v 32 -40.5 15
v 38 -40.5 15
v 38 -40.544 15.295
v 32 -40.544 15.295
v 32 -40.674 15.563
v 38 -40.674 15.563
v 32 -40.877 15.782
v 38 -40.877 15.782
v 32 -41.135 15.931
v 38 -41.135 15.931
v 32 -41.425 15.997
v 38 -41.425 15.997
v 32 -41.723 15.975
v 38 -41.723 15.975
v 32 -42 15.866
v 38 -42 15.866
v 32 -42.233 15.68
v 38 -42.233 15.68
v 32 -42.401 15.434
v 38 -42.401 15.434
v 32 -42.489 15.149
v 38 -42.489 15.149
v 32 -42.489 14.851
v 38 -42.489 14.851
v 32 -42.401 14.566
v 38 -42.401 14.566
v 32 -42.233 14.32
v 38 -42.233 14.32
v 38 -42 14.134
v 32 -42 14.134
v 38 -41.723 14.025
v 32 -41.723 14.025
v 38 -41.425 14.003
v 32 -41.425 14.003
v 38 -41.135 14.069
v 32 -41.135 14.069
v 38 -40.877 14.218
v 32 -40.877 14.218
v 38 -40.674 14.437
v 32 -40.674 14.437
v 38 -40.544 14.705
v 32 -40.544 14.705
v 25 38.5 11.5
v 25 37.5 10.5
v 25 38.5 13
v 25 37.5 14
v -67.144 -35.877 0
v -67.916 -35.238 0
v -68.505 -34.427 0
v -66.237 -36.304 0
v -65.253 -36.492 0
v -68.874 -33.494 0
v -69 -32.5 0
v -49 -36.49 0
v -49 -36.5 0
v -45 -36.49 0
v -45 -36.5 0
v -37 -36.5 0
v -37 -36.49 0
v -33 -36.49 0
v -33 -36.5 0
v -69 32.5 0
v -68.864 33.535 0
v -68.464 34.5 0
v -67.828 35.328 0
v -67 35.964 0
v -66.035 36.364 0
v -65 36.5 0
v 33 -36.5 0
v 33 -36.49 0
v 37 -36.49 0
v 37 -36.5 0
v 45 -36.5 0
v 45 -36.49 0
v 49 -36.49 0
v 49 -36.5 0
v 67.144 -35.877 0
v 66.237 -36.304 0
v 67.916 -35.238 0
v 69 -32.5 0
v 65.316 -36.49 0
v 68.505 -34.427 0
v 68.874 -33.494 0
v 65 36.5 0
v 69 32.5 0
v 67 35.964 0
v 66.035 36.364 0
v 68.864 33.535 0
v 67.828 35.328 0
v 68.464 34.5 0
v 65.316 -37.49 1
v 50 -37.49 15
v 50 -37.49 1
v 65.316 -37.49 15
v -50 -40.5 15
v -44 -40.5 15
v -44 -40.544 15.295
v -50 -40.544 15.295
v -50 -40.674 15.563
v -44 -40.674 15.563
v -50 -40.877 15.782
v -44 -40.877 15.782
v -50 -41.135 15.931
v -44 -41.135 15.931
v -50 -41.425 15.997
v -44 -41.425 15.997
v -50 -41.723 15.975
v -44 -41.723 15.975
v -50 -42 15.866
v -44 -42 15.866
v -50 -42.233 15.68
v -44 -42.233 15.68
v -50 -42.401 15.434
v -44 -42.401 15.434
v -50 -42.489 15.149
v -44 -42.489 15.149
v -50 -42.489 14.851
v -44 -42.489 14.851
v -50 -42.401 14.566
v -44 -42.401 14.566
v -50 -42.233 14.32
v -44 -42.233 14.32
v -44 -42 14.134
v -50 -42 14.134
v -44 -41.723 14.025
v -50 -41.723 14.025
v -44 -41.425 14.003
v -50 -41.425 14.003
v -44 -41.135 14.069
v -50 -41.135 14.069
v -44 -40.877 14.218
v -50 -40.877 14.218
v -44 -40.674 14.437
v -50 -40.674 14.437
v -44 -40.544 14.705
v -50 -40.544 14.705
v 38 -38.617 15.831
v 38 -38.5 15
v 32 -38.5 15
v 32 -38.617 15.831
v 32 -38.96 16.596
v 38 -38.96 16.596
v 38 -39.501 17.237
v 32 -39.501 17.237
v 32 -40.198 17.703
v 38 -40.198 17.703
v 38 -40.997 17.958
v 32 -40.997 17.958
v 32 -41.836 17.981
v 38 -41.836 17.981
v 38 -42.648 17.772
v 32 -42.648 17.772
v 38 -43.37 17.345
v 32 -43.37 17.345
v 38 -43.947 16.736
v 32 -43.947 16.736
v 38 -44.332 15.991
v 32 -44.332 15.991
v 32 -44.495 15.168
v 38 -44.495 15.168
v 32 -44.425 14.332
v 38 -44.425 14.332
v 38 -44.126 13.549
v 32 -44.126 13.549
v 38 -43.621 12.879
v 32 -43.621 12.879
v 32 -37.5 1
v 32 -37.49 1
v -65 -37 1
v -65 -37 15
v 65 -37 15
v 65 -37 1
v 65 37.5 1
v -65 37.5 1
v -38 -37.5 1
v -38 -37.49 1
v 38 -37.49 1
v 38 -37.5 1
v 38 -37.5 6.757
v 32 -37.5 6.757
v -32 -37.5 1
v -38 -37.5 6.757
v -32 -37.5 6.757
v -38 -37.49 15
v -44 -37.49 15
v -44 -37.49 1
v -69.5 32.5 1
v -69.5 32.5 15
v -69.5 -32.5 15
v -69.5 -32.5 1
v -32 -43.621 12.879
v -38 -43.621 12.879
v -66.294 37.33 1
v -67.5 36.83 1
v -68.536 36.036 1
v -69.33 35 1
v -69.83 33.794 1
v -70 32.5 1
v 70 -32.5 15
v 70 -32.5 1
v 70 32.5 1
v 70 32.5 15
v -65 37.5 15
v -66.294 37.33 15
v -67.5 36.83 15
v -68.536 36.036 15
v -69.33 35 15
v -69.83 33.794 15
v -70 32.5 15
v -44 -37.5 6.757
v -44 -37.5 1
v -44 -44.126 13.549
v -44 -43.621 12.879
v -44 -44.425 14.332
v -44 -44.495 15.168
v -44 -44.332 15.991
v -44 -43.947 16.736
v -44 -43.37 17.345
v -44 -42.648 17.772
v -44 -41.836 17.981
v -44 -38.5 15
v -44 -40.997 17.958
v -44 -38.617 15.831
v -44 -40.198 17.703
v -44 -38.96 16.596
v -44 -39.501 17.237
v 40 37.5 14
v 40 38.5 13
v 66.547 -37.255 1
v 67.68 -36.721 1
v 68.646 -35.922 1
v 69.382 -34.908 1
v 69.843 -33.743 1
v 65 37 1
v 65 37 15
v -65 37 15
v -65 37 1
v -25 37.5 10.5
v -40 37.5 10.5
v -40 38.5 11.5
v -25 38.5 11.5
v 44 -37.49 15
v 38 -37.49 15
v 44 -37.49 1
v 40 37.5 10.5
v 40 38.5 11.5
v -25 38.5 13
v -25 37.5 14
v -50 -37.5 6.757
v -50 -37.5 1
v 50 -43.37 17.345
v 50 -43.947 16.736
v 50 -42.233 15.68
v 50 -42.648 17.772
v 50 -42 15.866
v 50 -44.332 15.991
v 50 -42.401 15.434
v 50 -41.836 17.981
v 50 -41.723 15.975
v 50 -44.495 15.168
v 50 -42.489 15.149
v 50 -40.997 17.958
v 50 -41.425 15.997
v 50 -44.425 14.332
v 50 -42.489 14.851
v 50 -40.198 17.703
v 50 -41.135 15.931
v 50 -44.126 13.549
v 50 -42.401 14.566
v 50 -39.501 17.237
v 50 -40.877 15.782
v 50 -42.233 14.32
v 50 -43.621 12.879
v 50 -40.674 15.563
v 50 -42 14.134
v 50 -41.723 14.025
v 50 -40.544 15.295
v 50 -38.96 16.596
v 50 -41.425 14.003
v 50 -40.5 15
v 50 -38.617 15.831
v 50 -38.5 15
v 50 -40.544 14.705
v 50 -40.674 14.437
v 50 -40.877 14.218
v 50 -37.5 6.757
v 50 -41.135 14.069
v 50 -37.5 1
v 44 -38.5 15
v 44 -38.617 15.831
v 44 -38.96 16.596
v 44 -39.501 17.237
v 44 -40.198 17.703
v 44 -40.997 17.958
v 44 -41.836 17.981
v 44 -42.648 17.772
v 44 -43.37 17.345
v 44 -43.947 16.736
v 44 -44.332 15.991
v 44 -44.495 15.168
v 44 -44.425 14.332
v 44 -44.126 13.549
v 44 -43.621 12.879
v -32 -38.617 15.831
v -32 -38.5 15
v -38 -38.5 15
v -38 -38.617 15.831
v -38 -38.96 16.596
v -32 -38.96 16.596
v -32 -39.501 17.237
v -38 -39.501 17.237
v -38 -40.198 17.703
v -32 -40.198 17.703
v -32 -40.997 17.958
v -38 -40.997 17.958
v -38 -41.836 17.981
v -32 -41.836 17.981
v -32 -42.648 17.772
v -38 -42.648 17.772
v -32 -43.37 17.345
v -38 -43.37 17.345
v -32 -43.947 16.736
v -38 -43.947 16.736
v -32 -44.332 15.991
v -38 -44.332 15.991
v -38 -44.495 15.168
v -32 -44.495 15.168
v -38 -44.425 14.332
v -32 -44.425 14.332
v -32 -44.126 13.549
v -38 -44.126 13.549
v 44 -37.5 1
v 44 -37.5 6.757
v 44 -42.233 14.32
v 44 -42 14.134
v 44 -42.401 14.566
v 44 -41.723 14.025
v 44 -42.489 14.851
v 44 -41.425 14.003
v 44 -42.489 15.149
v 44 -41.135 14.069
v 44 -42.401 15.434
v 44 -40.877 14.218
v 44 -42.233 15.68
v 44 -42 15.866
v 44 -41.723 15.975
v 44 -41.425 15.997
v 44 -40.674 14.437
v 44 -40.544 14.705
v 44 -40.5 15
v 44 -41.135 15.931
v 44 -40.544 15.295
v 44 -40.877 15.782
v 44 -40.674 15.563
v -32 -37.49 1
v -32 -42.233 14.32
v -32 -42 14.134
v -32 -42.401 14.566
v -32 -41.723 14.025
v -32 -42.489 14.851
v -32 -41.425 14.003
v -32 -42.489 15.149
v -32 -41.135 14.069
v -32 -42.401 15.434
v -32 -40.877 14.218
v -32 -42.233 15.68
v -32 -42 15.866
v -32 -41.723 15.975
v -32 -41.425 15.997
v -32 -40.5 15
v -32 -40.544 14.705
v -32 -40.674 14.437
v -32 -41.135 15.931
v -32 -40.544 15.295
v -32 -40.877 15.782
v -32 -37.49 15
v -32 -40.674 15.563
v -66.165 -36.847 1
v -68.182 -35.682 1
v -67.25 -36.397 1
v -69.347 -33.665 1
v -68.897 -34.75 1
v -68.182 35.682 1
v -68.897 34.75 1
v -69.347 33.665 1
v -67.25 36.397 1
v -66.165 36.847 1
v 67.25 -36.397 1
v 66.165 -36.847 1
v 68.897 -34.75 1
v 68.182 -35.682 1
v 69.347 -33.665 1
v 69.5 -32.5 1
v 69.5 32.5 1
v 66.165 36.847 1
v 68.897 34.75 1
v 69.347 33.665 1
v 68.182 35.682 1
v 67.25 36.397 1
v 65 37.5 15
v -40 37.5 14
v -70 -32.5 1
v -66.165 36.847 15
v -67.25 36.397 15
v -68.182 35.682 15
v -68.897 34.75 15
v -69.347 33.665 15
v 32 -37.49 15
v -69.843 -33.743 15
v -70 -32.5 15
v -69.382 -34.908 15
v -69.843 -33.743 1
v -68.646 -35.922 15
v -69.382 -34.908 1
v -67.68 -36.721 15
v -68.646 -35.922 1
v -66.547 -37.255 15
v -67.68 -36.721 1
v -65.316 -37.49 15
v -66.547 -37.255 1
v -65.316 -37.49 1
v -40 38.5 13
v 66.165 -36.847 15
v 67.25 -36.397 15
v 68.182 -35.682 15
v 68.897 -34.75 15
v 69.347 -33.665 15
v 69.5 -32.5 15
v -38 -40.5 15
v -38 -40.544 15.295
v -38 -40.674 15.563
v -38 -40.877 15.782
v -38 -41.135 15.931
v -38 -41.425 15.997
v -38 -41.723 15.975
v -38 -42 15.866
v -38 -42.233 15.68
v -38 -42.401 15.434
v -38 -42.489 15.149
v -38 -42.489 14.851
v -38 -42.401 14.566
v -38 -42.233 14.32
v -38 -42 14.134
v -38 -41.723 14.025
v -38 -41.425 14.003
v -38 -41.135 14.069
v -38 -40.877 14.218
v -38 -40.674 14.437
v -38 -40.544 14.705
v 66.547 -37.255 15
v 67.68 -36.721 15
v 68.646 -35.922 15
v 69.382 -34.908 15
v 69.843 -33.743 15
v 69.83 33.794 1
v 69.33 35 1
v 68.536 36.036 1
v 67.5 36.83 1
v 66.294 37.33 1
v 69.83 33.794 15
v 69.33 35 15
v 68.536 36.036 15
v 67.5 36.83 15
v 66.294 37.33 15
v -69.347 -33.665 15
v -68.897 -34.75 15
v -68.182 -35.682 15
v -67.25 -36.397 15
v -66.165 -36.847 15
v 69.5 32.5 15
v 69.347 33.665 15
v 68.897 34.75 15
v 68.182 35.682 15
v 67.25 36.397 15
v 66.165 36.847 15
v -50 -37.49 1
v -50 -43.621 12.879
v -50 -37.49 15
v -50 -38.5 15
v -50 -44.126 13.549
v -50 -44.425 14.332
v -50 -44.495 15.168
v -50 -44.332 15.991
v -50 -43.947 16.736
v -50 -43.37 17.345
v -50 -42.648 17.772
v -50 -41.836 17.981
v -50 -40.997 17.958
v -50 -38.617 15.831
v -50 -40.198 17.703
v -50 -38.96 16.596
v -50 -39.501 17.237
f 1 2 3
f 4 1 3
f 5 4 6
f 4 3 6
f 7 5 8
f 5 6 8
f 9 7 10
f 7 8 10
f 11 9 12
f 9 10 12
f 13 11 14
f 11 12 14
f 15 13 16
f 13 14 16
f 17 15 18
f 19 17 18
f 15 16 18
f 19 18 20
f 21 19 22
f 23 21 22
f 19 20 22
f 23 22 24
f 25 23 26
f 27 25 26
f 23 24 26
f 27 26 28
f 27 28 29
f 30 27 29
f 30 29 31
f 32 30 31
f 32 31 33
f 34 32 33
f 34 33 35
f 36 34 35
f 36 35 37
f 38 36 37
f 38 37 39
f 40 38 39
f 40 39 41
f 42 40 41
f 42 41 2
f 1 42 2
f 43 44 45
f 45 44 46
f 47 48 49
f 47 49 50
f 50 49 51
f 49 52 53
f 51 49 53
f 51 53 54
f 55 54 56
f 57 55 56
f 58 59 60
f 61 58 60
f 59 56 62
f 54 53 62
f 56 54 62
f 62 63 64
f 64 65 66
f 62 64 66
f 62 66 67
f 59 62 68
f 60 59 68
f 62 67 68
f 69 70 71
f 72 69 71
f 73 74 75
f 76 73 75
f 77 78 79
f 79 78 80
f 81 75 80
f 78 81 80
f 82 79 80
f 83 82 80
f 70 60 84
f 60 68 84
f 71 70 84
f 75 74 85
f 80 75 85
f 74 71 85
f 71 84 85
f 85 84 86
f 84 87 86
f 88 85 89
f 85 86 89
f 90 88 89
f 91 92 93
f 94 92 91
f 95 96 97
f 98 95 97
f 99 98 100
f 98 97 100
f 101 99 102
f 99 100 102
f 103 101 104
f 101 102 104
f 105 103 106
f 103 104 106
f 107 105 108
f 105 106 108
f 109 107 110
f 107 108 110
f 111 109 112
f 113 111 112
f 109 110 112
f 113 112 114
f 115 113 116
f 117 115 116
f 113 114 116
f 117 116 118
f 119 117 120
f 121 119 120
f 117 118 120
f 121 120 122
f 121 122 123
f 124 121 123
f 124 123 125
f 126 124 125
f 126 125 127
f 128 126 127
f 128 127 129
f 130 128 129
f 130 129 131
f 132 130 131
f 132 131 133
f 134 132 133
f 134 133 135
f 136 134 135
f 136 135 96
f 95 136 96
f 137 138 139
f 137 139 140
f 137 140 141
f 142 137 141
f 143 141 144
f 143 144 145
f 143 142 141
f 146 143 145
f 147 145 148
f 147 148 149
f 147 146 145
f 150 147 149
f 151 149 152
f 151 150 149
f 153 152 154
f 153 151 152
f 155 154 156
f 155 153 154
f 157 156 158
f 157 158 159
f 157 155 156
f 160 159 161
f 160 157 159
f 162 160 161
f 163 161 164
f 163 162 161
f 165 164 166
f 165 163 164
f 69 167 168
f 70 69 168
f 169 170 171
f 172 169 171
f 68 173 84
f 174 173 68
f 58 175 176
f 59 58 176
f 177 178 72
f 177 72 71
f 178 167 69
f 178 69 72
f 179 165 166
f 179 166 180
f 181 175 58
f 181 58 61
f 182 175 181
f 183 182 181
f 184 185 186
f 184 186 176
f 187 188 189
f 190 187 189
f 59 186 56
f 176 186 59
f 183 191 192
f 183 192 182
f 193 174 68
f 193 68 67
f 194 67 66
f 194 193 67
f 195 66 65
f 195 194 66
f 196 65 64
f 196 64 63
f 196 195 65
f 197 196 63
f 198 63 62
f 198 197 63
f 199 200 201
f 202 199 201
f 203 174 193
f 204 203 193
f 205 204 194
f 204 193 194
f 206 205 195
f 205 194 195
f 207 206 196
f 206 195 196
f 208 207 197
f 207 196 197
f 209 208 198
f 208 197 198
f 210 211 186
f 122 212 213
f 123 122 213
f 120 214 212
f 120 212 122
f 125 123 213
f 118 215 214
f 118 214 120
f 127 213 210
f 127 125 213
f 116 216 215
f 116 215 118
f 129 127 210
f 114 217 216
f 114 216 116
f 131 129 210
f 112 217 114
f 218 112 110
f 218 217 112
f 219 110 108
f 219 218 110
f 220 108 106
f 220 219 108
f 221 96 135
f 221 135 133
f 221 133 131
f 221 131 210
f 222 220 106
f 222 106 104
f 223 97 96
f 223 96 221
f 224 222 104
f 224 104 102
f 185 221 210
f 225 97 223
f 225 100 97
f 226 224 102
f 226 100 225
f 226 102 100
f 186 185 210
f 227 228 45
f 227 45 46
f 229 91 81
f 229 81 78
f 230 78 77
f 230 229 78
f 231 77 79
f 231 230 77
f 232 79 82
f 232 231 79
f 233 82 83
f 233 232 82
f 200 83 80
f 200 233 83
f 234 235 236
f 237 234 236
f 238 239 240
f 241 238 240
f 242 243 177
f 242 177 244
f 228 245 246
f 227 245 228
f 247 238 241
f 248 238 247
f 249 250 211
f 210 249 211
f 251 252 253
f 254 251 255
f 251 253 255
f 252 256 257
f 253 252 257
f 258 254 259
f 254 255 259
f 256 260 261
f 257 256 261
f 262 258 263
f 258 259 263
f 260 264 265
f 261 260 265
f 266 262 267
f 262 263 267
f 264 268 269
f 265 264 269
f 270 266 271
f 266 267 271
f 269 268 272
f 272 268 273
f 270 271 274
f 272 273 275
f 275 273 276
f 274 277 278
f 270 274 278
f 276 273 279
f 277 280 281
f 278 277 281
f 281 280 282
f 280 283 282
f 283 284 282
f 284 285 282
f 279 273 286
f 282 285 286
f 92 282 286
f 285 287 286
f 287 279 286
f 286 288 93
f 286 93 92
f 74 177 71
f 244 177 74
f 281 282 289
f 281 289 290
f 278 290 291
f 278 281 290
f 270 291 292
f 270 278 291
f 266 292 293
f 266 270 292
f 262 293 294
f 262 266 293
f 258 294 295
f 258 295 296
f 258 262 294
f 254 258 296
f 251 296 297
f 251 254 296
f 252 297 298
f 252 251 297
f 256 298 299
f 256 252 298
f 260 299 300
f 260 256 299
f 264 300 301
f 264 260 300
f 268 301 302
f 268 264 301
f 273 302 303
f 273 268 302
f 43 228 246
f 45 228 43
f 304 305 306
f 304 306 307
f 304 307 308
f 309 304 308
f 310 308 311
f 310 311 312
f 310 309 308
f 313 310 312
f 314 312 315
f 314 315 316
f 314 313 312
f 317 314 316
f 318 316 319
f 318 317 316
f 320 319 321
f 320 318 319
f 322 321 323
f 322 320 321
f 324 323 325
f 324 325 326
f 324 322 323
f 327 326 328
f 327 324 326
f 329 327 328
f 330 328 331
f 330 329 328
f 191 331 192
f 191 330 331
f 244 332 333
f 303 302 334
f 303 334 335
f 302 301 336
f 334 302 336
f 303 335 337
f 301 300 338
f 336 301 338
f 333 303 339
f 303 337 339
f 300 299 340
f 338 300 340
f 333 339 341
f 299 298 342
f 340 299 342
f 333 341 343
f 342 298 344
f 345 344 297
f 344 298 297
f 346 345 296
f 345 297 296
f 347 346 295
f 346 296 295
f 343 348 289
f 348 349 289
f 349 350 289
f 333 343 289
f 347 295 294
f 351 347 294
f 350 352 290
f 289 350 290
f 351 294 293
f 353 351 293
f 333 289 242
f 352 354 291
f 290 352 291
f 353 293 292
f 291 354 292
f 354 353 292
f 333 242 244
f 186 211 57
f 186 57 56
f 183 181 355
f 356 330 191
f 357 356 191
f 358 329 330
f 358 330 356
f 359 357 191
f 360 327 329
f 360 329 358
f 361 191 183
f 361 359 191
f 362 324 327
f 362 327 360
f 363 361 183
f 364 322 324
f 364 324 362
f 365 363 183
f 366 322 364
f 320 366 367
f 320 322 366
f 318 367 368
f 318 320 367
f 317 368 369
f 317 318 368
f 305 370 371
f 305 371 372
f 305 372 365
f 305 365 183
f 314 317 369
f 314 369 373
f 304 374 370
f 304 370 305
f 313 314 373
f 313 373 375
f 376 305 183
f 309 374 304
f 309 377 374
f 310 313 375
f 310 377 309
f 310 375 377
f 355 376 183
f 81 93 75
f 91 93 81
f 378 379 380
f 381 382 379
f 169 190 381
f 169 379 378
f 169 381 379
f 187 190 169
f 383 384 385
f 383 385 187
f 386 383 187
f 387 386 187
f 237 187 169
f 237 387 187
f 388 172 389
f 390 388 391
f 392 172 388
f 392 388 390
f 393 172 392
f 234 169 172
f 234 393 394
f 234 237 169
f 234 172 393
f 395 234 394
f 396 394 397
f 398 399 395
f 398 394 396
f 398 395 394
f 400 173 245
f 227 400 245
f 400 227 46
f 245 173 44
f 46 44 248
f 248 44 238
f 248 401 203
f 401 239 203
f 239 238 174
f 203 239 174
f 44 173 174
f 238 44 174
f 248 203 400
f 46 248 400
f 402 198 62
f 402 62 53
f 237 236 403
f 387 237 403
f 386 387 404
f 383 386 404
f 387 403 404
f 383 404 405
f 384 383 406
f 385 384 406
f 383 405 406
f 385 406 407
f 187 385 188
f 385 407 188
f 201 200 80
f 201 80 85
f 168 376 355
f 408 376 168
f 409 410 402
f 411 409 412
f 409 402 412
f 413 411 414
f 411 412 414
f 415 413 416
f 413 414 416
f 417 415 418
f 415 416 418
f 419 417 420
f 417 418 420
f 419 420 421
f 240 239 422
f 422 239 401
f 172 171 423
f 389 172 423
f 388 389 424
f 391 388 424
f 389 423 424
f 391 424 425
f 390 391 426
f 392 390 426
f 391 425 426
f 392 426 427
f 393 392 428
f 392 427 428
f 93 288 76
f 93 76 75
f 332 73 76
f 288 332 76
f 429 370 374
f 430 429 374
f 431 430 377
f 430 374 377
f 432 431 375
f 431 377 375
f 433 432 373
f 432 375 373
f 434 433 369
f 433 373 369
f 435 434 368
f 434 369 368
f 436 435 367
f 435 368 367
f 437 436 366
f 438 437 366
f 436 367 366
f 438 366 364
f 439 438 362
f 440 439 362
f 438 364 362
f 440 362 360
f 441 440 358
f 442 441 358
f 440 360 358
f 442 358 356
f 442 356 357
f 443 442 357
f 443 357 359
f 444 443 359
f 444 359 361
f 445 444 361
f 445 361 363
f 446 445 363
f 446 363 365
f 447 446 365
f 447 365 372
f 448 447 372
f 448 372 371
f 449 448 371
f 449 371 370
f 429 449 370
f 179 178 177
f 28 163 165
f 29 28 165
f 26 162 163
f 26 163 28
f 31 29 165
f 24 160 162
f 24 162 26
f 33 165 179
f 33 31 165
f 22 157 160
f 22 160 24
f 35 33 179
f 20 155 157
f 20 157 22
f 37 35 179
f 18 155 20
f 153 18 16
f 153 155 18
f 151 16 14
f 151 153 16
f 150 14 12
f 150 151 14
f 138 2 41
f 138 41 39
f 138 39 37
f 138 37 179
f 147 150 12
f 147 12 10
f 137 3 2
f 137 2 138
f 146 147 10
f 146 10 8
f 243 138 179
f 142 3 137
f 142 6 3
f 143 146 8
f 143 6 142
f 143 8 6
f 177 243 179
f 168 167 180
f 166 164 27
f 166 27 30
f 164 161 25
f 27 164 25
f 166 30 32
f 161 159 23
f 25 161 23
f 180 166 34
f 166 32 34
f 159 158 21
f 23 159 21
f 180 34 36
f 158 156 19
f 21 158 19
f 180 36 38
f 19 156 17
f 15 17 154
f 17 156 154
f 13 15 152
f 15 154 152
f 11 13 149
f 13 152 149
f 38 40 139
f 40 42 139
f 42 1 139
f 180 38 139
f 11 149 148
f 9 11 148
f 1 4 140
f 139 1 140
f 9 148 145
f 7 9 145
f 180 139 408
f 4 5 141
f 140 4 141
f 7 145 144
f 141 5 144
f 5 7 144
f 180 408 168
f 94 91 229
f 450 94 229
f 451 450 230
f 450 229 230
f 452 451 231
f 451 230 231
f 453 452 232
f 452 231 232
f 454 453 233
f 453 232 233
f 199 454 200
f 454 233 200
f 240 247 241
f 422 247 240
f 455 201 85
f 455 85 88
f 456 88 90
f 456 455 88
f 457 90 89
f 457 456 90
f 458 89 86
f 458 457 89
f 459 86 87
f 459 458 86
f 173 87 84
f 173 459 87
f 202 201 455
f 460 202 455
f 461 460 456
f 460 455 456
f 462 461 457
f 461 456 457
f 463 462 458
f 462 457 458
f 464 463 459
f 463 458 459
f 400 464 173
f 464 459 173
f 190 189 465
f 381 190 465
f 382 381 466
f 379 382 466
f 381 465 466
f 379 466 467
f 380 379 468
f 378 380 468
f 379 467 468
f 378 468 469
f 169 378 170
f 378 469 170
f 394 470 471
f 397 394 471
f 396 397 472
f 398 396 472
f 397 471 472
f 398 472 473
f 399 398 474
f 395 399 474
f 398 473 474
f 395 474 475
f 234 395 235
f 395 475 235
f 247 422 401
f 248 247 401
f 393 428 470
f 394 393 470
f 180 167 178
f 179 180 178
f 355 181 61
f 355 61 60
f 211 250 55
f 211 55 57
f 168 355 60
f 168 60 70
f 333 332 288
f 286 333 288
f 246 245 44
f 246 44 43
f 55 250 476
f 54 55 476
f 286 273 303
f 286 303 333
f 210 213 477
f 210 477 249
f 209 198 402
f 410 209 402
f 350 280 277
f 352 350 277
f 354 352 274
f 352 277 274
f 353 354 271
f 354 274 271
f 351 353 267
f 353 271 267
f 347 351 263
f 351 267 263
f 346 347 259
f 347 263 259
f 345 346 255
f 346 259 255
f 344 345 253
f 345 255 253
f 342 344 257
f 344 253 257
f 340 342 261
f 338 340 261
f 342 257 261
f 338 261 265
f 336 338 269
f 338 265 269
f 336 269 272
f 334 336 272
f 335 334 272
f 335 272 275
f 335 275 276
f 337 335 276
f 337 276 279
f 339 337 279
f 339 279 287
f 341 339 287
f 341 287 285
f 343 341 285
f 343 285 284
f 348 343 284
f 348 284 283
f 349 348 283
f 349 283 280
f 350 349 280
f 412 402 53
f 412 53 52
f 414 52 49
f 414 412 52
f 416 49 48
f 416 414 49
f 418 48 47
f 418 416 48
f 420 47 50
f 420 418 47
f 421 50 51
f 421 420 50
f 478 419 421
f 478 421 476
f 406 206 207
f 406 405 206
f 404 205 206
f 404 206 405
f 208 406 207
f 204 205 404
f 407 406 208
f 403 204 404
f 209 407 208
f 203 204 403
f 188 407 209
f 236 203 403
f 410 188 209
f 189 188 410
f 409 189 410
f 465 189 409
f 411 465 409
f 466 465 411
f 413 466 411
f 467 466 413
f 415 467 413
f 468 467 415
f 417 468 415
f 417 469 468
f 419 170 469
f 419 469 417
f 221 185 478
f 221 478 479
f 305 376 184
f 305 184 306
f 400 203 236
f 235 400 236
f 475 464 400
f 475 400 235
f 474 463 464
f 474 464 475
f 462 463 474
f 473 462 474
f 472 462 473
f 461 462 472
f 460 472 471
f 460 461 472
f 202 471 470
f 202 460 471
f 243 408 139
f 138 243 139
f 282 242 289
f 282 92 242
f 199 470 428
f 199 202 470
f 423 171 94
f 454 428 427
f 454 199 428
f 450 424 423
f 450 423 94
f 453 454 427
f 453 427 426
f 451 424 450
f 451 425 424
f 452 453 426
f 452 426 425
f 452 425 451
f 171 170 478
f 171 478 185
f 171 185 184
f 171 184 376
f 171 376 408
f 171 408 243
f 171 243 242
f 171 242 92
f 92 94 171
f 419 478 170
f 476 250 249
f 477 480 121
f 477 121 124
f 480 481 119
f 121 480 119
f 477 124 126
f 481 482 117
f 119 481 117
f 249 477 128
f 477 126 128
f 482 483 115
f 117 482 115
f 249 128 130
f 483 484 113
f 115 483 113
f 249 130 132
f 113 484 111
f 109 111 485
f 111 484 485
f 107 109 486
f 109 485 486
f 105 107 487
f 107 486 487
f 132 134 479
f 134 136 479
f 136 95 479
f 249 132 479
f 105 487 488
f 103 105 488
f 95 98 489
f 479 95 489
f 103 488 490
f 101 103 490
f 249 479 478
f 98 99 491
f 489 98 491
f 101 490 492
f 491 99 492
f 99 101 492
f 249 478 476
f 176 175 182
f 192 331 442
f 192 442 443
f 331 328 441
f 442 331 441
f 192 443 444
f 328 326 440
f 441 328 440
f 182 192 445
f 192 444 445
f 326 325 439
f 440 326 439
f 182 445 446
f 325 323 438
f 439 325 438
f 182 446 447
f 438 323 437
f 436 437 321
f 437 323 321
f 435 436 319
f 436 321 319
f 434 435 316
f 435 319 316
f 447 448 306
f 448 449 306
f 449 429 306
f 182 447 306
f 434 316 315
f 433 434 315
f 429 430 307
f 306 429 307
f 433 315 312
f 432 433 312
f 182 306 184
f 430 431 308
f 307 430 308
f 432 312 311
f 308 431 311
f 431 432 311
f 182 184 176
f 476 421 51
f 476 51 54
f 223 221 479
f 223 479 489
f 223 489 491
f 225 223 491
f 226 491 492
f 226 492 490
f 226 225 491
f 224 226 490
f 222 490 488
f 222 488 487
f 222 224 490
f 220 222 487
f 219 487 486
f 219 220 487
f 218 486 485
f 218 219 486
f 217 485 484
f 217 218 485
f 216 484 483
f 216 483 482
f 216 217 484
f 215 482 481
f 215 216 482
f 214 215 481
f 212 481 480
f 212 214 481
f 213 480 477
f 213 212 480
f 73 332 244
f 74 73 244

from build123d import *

# Parameters (mm, degrees)
PAD_DEPTH            = 15
POCKET_DEPTH         = 14
SKETCH002_R          = 1
PAD001_DEPTH         = 140
SKETCH008_W          = 20
SKETCH008_H          = 20
SKETCH008_W_2        = 6
SKETCH008_W_3        = 64
POCKET004_DEPTH      = 15.001
POCKET004_DEPTH_BACK = 3.001
SKETCH009_W          = 15
SKETCH009_H          = 3.5
PAD004_DEPTH         = 1
POCKET005_DEPTH      = 140.001
CHAMFER001_SIZE      = 1


with BuildPart() as part:
    # Sketch → Pad (new body)
    with BuildSketch(Plane.XY):
        with BuildLine():
            Line((-70, 32.5), (-70, -32.5))
            ThreePointArc((-70, -32.5), (-68.535534, -36.035534), (-65, -37.5))
            Line((-65, -37.5), (65, -37.5))
            ThreePointArc((65, -37.5), (68.535534, -36.035534), (70, -32.5))
            Line((70, -32.5), (70, 32.5))
            ThreePointArc((70, 32.5), (68.535534, 36.035534), (65, 37.5))
            Line((65, 37.5), (-65, 37.5))
            ThreePointArc((-65, 37.5), (-68.535534, 36.035534), (-70, 32.5))
        make_face()
    extrude(amount=PAD_DEPTH)

    # Sketch001 (on Face10 of Pad) → Pocket (cut)
    with BuildSketch(Plane.XY.offset(15)):
        with BuildLine():
            Line((-69.5, 32.5), (-69.5, -32.5))
            ThreePointArc((-69.5, -32.5), (-68.181981, -35.681981), (-65, -37))
            Line((-65, -37), (65, -37))
            ThreePointArc((65, -37), (68.181981, -35.681981), (69.5, -32.5))
            Line((69.5, -32.5), (69.5, 32.5))
            ThreePointArc((69.5, 32.5), (68.181981, 35.681981), (65, 37))
            Line((65, 37), (-65, 37))
            ThreePointArc((-65, 37), (-68.181981, 35.681981), (-69.5, 32.5))
        make_face()
    extrude(amount=-POCKET_DEPTH, mode=Mode.SUBTRACT)

    # Sketch002 (on Face9 of Pocket) → Pad001 (join)
    with BuildSketch(Plane.YZ.offset(70)):
        with BuildLine():
            ThreePointArc((-38.5, 15), (-42.64805, 17.771639), (-43.62132, 12.87868))
            Line((-43.62132, 12.87868), (-37.5, 6.757359))
            Line((-37.5, 15), (-37.5, 6.757359))
            Line((-37.5, 15), (-38.5, 15))
        make_face()
        with Locations((-41.5, 15)):
            Circle(SKETCH002_R, mode=Mode.SUBTRACT)
    extrude(amount=-PAD001_DEPTH)

    # Sketch008 (on Face17 of Pad001) → Pocket004 (cut, two sides)
    with BuildSketch(Plane.XY.offset(15)) as pocket004_sk:
        with Locations((-60, -47.49)):
            Rectangle(SKETCH008_W, SKETCH008_H)
        with Locations((60, -47.49)):
            Rectangle(SKETCH008_W, SKETCH008_H)
        with Locations((41, -47.49)):
            Rectangle(SKETCH008_W_2, SKETCH008_H)
        with Locations((-41, -47.49)):
            Rectangle(SKETCH008_W_2, SKETCH008_H)
        with Locations((0, -47.49)):
            Rectangle(SKETCH008_W_3, SKETCH008_H)
    extrude(amount=-POCKET004_DEPTH, mode=Mode.SUBTRACT)
    extrude(pocket004_sk.sketch, amount=POCKET004_DEPTH_BACK, mode=Mode.SUBTRACT)

    # Sketch009 (on Face6 of Pocket004) → Pad004 (join)
    with BuildSketch(Plane(origin=(0, 37.5, 0), x_dir=(-1, 0, 0), z_dir=(0, 1, 0))):
        with Locations((32.5, 12.25)):
            Rectangle(SKETCH009_W, SKETCH009_H)
        with Locations((-32.5, 12.25)):
            Rectangle(SKETCH009_W, SKETCH009_H)
    extrude(amount=PAD004_DEPTH)

    # Sketch010 (on Face1 of Pad004) → Pocket005 (cut, through all)
    with BuildSketch(Plane(origin=(-70, 0, 0), x_dir=(0, -1, 0), z_dir=(-1, 0, 0))):
        Polygon((-37.5, 10.5), (-38.5, 11.5), (-38.5, 10.5), align=None)
        Polygon((-38.5, 13), (-37.5, 14), (-38.5, 14), align=None)
    extrude(amount=-POCKET005_DEPTH, mode=Mode.SUBTRACT)

    # Chamfer001
    chamfer001_edges = [part.edges().sort_by_distance(p)[0] for p in [
        (-68.535534, 36.035534, 0),
        (0, 37.5, 0),
        (68.535534, 36.035534, 0),
        (70, 0, 0),
        (68.645569, -35.921962, 0),
        (57.658035, -37.49, 0),
        (50, -37.495, 0),
        (47, -37.5, 0),
        (44, -37.495, 0),
        (41, -37.49, 0),
        (38, -37.495, 0),
        (35, -37.5, 0),
        (32, -37.495, 0),
        (0, -37.49, 0),
        (-32, -37.495, 0),
        (-35, -37.5, 0),
        (-38, -37.495, 0),
        (-41, -37.49, 0),
        (-44, -37.495, 0),
        (-47, -37.5, 0),
        (-50, -37.495, 0),
        (-57.658035, -37.49, 0),
        (-68.645569, -35.921962, 0),
        (-70, 0, 0),
    ]]
    chamfer(chamfer001_edges, length=CHAMFER001_SIZE)


solid = part.part
